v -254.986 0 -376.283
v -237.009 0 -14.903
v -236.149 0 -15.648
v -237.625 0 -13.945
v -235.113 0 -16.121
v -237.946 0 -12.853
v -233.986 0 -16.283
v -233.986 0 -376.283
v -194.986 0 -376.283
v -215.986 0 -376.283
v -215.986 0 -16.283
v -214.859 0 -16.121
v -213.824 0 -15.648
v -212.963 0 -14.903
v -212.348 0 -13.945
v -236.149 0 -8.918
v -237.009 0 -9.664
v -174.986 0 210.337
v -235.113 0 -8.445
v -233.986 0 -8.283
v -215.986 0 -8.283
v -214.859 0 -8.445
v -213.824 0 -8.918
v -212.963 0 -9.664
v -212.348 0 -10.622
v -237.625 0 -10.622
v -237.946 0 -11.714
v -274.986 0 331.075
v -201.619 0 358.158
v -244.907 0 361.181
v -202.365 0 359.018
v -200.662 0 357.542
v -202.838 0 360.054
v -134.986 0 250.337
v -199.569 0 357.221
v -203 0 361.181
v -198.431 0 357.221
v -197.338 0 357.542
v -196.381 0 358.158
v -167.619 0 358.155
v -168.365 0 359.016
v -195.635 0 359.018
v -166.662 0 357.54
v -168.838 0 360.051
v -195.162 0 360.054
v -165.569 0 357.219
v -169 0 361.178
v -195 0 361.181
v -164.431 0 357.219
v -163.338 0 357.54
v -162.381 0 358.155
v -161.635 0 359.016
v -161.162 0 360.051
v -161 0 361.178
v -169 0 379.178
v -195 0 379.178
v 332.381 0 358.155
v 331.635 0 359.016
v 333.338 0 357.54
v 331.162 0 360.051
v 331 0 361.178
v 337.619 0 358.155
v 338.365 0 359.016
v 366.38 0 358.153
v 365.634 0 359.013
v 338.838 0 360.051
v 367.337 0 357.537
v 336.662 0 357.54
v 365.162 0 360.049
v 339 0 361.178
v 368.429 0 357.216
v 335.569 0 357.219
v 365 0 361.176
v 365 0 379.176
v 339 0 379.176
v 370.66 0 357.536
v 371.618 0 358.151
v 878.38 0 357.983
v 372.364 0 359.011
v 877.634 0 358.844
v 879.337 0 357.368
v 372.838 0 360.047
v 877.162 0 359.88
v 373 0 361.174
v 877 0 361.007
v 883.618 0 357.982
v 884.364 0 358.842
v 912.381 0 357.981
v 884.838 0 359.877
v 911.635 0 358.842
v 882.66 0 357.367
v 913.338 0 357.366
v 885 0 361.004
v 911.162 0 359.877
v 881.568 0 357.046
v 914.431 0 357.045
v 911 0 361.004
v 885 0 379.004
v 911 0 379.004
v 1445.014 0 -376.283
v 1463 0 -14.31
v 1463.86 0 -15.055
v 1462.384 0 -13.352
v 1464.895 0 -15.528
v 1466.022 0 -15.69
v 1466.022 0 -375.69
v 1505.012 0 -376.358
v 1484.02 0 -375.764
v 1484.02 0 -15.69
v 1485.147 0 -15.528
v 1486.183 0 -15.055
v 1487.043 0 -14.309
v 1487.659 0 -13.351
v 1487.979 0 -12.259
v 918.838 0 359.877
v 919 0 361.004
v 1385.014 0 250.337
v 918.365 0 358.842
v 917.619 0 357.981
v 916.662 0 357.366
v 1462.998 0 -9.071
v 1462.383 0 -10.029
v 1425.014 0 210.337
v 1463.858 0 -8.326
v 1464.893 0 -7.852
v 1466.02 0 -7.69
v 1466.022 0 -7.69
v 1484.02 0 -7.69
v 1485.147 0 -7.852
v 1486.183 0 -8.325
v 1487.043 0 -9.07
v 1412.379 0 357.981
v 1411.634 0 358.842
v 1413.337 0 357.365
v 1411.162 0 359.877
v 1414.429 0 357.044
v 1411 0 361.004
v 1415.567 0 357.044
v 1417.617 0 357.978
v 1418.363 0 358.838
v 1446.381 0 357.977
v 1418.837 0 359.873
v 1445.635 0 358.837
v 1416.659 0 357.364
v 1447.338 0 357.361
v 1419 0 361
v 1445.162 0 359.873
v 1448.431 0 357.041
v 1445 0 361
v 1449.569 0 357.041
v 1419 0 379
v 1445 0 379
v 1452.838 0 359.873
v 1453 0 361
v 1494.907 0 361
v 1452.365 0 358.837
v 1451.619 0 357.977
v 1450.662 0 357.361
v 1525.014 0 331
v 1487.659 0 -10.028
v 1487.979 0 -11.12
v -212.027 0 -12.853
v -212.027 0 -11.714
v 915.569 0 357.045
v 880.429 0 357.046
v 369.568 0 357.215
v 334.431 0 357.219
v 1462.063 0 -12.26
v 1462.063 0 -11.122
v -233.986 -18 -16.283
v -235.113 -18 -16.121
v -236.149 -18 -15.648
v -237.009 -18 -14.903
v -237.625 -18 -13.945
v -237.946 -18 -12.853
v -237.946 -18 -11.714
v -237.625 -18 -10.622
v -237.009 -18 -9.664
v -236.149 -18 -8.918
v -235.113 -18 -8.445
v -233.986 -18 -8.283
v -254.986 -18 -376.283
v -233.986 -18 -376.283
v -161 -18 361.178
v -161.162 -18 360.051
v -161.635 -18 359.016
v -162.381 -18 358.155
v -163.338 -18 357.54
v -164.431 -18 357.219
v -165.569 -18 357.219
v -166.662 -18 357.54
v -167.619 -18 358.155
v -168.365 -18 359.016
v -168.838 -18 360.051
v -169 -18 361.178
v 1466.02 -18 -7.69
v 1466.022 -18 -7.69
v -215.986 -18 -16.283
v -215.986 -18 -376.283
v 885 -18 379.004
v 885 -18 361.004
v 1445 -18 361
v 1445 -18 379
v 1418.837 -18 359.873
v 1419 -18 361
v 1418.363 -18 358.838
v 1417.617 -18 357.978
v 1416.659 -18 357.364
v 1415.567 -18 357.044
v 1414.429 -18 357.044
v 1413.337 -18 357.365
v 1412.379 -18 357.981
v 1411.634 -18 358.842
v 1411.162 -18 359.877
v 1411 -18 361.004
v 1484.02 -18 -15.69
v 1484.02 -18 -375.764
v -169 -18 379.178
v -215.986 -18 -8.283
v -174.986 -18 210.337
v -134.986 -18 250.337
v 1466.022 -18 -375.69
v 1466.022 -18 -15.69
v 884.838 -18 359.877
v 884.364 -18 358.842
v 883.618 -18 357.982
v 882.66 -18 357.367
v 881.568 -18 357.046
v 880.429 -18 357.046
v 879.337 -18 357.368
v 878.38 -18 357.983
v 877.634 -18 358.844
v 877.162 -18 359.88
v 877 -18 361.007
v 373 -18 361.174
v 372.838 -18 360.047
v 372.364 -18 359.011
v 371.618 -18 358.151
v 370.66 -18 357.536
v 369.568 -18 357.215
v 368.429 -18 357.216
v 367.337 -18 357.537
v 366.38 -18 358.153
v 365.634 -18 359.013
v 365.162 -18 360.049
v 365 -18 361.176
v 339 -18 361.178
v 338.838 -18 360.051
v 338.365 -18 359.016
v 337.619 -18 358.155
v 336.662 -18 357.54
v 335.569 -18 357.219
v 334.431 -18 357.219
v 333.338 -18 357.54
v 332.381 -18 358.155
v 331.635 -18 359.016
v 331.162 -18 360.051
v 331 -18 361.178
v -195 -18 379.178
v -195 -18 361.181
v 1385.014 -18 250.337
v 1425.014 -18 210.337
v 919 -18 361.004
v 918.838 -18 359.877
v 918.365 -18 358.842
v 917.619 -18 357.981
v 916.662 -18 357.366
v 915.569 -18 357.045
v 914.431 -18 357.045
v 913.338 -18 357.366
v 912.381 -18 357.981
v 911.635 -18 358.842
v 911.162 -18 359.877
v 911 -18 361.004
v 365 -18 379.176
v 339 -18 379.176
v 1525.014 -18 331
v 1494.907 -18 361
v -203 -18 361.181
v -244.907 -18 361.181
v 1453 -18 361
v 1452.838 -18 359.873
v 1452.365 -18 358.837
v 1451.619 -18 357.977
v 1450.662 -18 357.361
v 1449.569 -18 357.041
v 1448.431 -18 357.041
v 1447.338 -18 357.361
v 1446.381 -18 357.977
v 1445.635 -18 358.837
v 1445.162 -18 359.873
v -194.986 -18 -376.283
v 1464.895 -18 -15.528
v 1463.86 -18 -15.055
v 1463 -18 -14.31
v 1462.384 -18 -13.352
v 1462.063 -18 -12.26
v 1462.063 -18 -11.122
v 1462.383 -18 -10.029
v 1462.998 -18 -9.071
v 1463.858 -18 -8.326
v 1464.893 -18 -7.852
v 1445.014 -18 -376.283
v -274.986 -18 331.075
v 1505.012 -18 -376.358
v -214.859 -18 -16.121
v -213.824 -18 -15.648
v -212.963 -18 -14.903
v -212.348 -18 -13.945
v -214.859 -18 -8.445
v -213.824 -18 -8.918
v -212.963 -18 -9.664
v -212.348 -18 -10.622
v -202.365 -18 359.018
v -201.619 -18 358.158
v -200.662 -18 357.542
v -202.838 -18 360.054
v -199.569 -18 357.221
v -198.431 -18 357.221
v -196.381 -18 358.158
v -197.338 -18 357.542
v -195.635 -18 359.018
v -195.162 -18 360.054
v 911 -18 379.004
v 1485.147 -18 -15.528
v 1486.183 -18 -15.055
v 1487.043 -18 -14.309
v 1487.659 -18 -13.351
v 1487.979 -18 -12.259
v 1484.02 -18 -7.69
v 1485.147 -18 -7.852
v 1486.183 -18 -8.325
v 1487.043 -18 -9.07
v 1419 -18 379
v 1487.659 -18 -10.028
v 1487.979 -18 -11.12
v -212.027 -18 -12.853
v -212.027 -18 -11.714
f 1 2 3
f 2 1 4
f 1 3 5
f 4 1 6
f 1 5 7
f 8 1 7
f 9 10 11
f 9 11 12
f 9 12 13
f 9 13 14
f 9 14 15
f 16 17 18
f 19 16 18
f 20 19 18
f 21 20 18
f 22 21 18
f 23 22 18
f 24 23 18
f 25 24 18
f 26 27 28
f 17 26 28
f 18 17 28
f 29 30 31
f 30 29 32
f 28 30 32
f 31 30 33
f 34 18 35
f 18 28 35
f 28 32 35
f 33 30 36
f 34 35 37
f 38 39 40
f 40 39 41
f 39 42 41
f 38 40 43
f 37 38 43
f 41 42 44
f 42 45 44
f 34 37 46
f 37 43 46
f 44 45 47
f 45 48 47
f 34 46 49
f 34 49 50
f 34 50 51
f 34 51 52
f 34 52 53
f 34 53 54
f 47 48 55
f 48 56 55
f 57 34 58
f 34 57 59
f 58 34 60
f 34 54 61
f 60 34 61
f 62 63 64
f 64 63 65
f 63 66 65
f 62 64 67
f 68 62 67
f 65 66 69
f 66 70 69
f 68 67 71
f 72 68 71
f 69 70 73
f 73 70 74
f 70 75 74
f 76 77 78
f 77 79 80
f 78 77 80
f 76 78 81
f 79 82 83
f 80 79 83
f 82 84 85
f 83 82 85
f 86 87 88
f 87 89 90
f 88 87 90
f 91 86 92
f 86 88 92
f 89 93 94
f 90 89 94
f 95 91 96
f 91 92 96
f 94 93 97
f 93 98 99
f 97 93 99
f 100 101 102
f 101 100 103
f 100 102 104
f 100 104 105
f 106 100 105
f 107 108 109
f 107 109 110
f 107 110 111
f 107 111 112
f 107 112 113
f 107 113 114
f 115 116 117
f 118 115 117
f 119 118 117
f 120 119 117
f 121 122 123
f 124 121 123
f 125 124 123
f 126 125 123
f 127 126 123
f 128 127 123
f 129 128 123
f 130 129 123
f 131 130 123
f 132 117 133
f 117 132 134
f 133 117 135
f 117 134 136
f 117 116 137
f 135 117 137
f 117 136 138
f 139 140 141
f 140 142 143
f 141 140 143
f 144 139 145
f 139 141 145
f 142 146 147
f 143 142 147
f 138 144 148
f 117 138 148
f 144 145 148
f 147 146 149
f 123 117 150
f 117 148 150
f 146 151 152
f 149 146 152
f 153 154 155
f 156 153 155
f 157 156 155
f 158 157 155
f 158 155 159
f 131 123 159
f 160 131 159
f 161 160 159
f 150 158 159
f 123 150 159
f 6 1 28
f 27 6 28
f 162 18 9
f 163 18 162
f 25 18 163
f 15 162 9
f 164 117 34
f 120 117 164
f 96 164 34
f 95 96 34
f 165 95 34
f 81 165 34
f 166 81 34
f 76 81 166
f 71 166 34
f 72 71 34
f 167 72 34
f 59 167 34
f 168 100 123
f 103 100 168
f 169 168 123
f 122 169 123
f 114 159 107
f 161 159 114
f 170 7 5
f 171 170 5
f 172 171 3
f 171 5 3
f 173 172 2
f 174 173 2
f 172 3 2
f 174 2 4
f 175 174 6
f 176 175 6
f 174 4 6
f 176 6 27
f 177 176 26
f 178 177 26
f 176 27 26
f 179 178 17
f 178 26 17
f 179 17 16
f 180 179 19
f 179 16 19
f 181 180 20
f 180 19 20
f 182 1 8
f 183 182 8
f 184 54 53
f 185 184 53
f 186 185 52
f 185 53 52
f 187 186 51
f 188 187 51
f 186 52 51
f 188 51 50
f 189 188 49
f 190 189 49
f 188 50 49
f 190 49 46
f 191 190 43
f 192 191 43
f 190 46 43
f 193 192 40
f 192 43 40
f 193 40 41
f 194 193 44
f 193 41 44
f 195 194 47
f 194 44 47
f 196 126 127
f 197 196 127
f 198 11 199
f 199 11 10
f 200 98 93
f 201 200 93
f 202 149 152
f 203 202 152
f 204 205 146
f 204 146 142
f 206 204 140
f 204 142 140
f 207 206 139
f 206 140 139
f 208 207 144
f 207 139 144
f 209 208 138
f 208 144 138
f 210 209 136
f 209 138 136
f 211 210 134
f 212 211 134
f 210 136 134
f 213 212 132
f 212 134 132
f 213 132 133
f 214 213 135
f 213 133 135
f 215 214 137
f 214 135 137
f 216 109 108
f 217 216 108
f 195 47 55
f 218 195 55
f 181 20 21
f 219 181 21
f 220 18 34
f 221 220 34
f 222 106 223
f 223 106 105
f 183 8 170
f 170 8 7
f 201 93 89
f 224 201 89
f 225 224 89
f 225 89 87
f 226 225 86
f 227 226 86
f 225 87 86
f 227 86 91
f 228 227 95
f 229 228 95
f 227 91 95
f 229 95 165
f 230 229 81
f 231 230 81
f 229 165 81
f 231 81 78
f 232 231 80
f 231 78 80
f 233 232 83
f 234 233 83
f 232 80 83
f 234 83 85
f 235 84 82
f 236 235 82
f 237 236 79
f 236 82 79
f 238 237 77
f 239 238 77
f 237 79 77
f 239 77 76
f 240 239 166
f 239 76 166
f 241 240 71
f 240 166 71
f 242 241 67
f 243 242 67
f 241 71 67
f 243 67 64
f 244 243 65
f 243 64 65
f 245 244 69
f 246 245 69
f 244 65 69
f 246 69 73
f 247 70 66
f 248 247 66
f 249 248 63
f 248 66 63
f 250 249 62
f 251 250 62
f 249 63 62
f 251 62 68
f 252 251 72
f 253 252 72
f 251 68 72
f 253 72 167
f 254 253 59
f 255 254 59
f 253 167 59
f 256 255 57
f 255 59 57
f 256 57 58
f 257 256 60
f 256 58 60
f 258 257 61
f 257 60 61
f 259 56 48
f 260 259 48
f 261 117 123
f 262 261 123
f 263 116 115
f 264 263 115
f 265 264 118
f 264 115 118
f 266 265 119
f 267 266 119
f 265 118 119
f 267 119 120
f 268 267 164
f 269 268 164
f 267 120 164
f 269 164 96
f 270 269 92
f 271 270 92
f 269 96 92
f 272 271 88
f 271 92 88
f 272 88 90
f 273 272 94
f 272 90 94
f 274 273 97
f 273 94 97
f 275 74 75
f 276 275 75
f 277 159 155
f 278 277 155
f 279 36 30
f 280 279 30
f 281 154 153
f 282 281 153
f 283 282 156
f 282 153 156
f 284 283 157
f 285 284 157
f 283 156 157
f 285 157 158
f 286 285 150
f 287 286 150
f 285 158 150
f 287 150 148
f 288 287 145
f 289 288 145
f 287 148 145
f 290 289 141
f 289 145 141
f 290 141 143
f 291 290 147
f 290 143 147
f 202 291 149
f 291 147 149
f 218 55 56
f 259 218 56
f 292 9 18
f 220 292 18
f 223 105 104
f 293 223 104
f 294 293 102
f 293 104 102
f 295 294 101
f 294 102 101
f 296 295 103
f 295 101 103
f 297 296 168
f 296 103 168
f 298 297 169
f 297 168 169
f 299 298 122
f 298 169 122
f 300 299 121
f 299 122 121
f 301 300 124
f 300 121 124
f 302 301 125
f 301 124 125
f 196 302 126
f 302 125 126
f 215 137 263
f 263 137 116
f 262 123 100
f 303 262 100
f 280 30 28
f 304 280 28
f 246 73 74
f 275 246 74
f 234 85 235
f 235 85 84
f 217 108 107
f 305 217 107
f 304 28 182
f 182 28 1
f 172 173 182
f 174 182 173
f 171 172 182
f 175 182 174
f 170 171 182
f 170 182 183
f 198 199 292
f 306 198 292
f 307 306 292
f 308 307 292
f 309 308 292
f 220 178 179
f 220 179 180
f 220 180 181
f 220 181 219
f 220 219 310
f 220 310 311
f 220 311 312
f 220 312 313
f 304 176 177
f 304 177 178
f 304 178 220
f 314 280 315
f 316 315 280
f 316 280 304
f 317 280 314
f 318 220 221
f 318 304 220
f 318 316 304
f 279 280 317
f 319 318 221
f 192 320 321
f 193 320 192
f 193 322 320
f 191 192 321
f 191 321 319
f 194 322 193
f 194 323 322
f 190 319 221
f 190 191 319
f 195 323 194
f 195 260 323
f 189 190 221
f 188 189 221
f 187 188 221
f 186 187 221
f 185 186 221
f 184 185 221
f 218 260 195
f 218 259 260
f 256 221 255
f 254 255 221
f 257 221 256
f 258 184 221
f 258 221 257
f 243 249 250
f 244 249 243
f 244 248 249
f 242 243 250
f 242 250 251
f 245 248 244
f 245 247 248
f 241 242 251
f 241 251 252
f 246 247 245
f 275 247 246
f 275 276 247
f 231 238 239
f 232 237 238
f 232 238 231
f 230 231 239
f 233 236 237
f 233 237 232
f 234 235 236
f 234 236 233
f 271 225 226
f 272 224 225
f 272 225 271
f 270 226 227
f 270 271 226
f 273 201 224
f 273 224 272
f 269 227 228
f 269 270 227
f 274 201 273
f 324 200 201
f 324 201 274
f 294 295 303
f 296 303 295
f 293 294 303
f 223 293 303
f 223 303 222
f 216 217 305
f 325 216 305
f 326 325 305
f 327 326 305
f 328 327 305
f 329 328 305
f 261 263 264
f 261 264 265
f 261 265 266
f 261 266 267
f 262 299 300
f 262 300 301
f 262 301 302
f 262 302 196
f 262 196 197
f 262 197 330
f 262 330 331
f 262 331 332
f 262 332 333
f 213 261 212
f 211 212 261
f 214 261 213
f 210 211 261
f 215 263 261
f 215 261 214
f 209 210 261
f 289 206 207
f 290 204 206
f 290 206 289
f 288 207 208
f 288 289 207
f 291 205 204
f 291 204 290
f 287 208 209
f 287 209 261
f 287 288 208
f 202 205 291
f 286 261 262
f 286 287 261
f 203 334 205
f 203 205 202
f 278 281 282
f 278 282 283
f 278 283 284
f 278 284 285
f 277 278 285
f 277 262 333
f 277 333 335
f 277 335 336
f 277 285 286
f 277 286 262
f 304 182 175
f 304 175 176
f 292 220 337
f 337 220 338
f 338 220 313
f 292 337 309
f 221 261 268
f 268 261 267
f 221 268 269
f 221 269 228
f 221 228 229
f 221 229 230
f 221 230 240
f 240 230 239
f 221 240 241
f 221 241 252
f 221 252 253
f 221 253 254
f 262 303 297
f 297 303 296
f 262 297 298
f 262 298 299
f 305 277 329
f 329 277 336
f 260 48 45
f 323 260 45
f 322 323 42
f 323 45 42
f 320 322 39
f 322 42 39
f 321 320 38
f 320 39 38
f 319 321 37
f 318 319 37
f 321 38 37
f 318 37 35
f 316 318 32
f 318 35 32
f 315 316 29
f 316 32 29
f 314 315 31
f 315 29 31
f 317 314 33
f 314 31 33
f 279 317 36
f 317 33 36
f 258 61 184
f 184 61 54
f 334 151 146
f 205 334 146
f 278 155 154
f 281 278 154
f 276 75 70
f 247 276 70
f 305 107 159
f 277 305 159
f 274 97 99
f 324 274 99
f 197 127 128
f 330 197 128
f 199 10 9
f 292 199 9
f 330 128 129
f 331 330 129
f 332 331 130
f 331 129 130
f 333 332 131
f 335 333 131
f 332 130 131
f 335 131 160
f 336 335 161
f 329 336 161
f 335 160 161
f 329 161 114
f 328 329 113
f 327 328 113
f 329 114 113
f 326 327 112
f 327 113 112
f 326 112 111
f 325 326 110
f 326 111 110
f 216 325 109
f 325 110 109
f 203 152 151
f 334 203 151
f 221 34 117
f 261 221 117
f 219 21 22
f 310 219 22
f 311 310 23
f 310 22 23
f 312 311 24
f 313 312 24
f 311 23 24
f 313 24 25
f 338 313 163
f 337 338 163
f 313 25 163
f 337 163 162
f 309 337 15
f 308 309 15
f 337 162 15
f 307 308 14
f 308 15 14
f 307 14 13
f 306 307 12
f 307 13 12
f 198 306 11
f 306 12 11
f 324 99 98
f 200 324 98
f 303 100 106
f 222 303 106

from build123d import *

# Parameters (mm, degrees)
F1_DEPTH = 18


# Not quite as in the source:
# - ends of sketch curves that miss each other by under 0.0002 mm in the source are joined


with BuildPart() as f1:
    # F0 (on Front) → F1 (new body)
    with BuildSketch(Plane.XZ):
        with BuildLine():
            Line((1444.9999982887, 361), (1444.9999982887, 379))
            Line((1444.9999982887, 379), (1418.9999982887, 379))
            Line((1418.9999982887, 379), (1418.9999982887, 361.0032042947))
            Line((1418.9999982887, 361.0032042947), (1418.9999982887, 361))
            ThreePointArc((1418.9999982887, 361), (1414.9978620926, 357.0032048651), (1410.9999984313, 361.0042723931))
            Line((1410.9999984313, 361.0042723931), (918.9999984313, 361.0042723931))
            ThreePointArc((918.9999984313, 361.0042723931), (914.9999984313, 357.0042723931), (910.9999984313, 361.0042723931))
            Line((910.9999984313, 361.0042723931), (910.9999984313, 379.0042723931))
            Line((910.9999984313, 379.0042723931), (884.9999984313, 379.0042723931))
            Line((884.9999984313, 379.0042723931), (884.9999984313, 361.0055952483))
            Line((884.9999984313, 361.0055952483), (884.9999984313, 361.0042723931))
            ThreePointArc((884.9999984313, 361.0042723931), (880.9986755762, 357.005595467), (876.9999986501, 361.0069181034))
            Line((876.9999986501, 361.0069181034), (372.9999978512, 361.1735978616))
            ThreePointArc((372.9999978512, 361.1735978616), (368.9986752099, 357.1749209454), (364.9999982887, 361.1762435819))
            Line((364.9999982887, 361.1762435819), (364.9999982887, 379.1762435819))
            Line((364.9999982887, 379.1762435819), (338.9999982887, 379.1762435819))
            Line((338.9999982887, 379.1762435819), (338.9999982887, 361.1783797782))
            ThreePointArc((338.9999982887, 361.1783797782), (334.9999982887, 357.1783797782), (330.9999982887, 361.1783797782))
            Line((330.9999982887, 361.1783797782), (-161.0000017113, 361.1783797782))
            ThreePointArc((-161.0000017113, 361.1783797782), (-165.0000017113, 357.1783797782), (-169.0000017113, 361.1783797782))
            Line((-169.0000017113, 361.1783797782), (-169.0000017113, 379.1783797782))
            Line((-169.0000017113, 379.1783797782), (-195.0000017113, 379.1783797782))
            Line((-195.0000017113, 379.1783797782), (-195.0000012844, 361.180516095))
            ThreePointArc((-195.0000012844, 361.180516095), (-198.9999999526, 357.1805172846), (-202.9999987156, 361.1805160001))
            Line((-202.9999987156, 361.1805160001), (-215.9862284595, 361.1805160001))
            Line((-215.9862284595, 361.1805160001), (-233.9862284595, 361.1805160001))
            Line((-233.9862284595, 361.1805160001), (-244.90749278, 361.1805160001))
            Line((-244.90749278, 361.1805160001), (-274.9862284595, 331.0746893941))
            Line((-274.9862284595, 331.0746893941), (-254.9862284595, -376.2833213137))
            Line((-254.9862284595, -376.2833213137), (-233.9862284595, -376.2833213137))
            Line((-233.9862284595, -376.2833213137), (-233.9862284595, -16.2833213137))
            ThreePointArc((-233.9862284595, -16.2833213137), (-237.9862284595, -12.2833213137), (-233.9862284595, -8.2833213137))
            Line((-233.9862284595, -8.2833213137), (-215.9862284595, -8.2833213137))
            ThreePointArc((-215.9862284595, -8.2833213137), (-211.9862284595, -12.2833213137), (-215.9862284595, -16.2833213137))
            Line((-215.9862284595, -16.2833213137), (-215.9862284595, -376.2833213137))
            Line((-215.9862284595, -376.2833213137), (-194.9862284595, -376.2833213137))
            Line((-194.9862284595, -376.2833213137), (-174.9862284595, 210.3365797868))
            Line((-174.9862284595, 210.3365797868), (-134.9862284595, 250.3365797868))
            Line((-134.9862284595, 250.3365797868), (1385.0137715405, 250.3365797868))
            Line((1385.0137715405, 250.3365797868), (1425.0137715405, 210.3365797868))
            Line((1425.0137715405, 210.3365797868), (1445.0137715405, -376.2833213137))
            Line((1445.0137715405, -376.2833213137), (1466.022162316, -375.6897371419))
            Line((1466.022162316, -375.6897371419), (1466.022162316, -15.6897371419))
            ThreePointArc((1466.022162316, -15.6897371419), (1462.0221624552, -11.6907923518), (1466.0200518963, -7.6897376986))
            Line((1466.0200518963, -7.6897376986), (1466.022162316, -7.6897371419))
            Line((1466.022162316, -7.6897371419), (1484.020051896, -7.6897371419))
            ThreePointArc((1484.020051896, -7.6897371419), (1488.020051896, -11.6897371419), (1484.020051896, -15.6897371419))
            Line((1484.020051896, -15.6897371419), (1484.020051896, -375.7643703854))
            Line((1484.020051896, -375.7643703854), (1505.0116611204, -376.3579545571))
            Line((1505.0116611204, -376.3579545571), (1525.0137715405, 331))
            Line((1525.0137715405, 331), (1494.9069982887, 361))
            Line((1494.9069982887, 361), (1466.022162316, 361))
            Line((1466.022162316, 361), (1452.9999982887, 361))
            ThreePointArc((1452.9999982887, 361), (1448.9999982887, 357), (1444.9999982887, 361))
        make_face()
    extrude(amount=F1_DEPTH)


solid = f1.part
